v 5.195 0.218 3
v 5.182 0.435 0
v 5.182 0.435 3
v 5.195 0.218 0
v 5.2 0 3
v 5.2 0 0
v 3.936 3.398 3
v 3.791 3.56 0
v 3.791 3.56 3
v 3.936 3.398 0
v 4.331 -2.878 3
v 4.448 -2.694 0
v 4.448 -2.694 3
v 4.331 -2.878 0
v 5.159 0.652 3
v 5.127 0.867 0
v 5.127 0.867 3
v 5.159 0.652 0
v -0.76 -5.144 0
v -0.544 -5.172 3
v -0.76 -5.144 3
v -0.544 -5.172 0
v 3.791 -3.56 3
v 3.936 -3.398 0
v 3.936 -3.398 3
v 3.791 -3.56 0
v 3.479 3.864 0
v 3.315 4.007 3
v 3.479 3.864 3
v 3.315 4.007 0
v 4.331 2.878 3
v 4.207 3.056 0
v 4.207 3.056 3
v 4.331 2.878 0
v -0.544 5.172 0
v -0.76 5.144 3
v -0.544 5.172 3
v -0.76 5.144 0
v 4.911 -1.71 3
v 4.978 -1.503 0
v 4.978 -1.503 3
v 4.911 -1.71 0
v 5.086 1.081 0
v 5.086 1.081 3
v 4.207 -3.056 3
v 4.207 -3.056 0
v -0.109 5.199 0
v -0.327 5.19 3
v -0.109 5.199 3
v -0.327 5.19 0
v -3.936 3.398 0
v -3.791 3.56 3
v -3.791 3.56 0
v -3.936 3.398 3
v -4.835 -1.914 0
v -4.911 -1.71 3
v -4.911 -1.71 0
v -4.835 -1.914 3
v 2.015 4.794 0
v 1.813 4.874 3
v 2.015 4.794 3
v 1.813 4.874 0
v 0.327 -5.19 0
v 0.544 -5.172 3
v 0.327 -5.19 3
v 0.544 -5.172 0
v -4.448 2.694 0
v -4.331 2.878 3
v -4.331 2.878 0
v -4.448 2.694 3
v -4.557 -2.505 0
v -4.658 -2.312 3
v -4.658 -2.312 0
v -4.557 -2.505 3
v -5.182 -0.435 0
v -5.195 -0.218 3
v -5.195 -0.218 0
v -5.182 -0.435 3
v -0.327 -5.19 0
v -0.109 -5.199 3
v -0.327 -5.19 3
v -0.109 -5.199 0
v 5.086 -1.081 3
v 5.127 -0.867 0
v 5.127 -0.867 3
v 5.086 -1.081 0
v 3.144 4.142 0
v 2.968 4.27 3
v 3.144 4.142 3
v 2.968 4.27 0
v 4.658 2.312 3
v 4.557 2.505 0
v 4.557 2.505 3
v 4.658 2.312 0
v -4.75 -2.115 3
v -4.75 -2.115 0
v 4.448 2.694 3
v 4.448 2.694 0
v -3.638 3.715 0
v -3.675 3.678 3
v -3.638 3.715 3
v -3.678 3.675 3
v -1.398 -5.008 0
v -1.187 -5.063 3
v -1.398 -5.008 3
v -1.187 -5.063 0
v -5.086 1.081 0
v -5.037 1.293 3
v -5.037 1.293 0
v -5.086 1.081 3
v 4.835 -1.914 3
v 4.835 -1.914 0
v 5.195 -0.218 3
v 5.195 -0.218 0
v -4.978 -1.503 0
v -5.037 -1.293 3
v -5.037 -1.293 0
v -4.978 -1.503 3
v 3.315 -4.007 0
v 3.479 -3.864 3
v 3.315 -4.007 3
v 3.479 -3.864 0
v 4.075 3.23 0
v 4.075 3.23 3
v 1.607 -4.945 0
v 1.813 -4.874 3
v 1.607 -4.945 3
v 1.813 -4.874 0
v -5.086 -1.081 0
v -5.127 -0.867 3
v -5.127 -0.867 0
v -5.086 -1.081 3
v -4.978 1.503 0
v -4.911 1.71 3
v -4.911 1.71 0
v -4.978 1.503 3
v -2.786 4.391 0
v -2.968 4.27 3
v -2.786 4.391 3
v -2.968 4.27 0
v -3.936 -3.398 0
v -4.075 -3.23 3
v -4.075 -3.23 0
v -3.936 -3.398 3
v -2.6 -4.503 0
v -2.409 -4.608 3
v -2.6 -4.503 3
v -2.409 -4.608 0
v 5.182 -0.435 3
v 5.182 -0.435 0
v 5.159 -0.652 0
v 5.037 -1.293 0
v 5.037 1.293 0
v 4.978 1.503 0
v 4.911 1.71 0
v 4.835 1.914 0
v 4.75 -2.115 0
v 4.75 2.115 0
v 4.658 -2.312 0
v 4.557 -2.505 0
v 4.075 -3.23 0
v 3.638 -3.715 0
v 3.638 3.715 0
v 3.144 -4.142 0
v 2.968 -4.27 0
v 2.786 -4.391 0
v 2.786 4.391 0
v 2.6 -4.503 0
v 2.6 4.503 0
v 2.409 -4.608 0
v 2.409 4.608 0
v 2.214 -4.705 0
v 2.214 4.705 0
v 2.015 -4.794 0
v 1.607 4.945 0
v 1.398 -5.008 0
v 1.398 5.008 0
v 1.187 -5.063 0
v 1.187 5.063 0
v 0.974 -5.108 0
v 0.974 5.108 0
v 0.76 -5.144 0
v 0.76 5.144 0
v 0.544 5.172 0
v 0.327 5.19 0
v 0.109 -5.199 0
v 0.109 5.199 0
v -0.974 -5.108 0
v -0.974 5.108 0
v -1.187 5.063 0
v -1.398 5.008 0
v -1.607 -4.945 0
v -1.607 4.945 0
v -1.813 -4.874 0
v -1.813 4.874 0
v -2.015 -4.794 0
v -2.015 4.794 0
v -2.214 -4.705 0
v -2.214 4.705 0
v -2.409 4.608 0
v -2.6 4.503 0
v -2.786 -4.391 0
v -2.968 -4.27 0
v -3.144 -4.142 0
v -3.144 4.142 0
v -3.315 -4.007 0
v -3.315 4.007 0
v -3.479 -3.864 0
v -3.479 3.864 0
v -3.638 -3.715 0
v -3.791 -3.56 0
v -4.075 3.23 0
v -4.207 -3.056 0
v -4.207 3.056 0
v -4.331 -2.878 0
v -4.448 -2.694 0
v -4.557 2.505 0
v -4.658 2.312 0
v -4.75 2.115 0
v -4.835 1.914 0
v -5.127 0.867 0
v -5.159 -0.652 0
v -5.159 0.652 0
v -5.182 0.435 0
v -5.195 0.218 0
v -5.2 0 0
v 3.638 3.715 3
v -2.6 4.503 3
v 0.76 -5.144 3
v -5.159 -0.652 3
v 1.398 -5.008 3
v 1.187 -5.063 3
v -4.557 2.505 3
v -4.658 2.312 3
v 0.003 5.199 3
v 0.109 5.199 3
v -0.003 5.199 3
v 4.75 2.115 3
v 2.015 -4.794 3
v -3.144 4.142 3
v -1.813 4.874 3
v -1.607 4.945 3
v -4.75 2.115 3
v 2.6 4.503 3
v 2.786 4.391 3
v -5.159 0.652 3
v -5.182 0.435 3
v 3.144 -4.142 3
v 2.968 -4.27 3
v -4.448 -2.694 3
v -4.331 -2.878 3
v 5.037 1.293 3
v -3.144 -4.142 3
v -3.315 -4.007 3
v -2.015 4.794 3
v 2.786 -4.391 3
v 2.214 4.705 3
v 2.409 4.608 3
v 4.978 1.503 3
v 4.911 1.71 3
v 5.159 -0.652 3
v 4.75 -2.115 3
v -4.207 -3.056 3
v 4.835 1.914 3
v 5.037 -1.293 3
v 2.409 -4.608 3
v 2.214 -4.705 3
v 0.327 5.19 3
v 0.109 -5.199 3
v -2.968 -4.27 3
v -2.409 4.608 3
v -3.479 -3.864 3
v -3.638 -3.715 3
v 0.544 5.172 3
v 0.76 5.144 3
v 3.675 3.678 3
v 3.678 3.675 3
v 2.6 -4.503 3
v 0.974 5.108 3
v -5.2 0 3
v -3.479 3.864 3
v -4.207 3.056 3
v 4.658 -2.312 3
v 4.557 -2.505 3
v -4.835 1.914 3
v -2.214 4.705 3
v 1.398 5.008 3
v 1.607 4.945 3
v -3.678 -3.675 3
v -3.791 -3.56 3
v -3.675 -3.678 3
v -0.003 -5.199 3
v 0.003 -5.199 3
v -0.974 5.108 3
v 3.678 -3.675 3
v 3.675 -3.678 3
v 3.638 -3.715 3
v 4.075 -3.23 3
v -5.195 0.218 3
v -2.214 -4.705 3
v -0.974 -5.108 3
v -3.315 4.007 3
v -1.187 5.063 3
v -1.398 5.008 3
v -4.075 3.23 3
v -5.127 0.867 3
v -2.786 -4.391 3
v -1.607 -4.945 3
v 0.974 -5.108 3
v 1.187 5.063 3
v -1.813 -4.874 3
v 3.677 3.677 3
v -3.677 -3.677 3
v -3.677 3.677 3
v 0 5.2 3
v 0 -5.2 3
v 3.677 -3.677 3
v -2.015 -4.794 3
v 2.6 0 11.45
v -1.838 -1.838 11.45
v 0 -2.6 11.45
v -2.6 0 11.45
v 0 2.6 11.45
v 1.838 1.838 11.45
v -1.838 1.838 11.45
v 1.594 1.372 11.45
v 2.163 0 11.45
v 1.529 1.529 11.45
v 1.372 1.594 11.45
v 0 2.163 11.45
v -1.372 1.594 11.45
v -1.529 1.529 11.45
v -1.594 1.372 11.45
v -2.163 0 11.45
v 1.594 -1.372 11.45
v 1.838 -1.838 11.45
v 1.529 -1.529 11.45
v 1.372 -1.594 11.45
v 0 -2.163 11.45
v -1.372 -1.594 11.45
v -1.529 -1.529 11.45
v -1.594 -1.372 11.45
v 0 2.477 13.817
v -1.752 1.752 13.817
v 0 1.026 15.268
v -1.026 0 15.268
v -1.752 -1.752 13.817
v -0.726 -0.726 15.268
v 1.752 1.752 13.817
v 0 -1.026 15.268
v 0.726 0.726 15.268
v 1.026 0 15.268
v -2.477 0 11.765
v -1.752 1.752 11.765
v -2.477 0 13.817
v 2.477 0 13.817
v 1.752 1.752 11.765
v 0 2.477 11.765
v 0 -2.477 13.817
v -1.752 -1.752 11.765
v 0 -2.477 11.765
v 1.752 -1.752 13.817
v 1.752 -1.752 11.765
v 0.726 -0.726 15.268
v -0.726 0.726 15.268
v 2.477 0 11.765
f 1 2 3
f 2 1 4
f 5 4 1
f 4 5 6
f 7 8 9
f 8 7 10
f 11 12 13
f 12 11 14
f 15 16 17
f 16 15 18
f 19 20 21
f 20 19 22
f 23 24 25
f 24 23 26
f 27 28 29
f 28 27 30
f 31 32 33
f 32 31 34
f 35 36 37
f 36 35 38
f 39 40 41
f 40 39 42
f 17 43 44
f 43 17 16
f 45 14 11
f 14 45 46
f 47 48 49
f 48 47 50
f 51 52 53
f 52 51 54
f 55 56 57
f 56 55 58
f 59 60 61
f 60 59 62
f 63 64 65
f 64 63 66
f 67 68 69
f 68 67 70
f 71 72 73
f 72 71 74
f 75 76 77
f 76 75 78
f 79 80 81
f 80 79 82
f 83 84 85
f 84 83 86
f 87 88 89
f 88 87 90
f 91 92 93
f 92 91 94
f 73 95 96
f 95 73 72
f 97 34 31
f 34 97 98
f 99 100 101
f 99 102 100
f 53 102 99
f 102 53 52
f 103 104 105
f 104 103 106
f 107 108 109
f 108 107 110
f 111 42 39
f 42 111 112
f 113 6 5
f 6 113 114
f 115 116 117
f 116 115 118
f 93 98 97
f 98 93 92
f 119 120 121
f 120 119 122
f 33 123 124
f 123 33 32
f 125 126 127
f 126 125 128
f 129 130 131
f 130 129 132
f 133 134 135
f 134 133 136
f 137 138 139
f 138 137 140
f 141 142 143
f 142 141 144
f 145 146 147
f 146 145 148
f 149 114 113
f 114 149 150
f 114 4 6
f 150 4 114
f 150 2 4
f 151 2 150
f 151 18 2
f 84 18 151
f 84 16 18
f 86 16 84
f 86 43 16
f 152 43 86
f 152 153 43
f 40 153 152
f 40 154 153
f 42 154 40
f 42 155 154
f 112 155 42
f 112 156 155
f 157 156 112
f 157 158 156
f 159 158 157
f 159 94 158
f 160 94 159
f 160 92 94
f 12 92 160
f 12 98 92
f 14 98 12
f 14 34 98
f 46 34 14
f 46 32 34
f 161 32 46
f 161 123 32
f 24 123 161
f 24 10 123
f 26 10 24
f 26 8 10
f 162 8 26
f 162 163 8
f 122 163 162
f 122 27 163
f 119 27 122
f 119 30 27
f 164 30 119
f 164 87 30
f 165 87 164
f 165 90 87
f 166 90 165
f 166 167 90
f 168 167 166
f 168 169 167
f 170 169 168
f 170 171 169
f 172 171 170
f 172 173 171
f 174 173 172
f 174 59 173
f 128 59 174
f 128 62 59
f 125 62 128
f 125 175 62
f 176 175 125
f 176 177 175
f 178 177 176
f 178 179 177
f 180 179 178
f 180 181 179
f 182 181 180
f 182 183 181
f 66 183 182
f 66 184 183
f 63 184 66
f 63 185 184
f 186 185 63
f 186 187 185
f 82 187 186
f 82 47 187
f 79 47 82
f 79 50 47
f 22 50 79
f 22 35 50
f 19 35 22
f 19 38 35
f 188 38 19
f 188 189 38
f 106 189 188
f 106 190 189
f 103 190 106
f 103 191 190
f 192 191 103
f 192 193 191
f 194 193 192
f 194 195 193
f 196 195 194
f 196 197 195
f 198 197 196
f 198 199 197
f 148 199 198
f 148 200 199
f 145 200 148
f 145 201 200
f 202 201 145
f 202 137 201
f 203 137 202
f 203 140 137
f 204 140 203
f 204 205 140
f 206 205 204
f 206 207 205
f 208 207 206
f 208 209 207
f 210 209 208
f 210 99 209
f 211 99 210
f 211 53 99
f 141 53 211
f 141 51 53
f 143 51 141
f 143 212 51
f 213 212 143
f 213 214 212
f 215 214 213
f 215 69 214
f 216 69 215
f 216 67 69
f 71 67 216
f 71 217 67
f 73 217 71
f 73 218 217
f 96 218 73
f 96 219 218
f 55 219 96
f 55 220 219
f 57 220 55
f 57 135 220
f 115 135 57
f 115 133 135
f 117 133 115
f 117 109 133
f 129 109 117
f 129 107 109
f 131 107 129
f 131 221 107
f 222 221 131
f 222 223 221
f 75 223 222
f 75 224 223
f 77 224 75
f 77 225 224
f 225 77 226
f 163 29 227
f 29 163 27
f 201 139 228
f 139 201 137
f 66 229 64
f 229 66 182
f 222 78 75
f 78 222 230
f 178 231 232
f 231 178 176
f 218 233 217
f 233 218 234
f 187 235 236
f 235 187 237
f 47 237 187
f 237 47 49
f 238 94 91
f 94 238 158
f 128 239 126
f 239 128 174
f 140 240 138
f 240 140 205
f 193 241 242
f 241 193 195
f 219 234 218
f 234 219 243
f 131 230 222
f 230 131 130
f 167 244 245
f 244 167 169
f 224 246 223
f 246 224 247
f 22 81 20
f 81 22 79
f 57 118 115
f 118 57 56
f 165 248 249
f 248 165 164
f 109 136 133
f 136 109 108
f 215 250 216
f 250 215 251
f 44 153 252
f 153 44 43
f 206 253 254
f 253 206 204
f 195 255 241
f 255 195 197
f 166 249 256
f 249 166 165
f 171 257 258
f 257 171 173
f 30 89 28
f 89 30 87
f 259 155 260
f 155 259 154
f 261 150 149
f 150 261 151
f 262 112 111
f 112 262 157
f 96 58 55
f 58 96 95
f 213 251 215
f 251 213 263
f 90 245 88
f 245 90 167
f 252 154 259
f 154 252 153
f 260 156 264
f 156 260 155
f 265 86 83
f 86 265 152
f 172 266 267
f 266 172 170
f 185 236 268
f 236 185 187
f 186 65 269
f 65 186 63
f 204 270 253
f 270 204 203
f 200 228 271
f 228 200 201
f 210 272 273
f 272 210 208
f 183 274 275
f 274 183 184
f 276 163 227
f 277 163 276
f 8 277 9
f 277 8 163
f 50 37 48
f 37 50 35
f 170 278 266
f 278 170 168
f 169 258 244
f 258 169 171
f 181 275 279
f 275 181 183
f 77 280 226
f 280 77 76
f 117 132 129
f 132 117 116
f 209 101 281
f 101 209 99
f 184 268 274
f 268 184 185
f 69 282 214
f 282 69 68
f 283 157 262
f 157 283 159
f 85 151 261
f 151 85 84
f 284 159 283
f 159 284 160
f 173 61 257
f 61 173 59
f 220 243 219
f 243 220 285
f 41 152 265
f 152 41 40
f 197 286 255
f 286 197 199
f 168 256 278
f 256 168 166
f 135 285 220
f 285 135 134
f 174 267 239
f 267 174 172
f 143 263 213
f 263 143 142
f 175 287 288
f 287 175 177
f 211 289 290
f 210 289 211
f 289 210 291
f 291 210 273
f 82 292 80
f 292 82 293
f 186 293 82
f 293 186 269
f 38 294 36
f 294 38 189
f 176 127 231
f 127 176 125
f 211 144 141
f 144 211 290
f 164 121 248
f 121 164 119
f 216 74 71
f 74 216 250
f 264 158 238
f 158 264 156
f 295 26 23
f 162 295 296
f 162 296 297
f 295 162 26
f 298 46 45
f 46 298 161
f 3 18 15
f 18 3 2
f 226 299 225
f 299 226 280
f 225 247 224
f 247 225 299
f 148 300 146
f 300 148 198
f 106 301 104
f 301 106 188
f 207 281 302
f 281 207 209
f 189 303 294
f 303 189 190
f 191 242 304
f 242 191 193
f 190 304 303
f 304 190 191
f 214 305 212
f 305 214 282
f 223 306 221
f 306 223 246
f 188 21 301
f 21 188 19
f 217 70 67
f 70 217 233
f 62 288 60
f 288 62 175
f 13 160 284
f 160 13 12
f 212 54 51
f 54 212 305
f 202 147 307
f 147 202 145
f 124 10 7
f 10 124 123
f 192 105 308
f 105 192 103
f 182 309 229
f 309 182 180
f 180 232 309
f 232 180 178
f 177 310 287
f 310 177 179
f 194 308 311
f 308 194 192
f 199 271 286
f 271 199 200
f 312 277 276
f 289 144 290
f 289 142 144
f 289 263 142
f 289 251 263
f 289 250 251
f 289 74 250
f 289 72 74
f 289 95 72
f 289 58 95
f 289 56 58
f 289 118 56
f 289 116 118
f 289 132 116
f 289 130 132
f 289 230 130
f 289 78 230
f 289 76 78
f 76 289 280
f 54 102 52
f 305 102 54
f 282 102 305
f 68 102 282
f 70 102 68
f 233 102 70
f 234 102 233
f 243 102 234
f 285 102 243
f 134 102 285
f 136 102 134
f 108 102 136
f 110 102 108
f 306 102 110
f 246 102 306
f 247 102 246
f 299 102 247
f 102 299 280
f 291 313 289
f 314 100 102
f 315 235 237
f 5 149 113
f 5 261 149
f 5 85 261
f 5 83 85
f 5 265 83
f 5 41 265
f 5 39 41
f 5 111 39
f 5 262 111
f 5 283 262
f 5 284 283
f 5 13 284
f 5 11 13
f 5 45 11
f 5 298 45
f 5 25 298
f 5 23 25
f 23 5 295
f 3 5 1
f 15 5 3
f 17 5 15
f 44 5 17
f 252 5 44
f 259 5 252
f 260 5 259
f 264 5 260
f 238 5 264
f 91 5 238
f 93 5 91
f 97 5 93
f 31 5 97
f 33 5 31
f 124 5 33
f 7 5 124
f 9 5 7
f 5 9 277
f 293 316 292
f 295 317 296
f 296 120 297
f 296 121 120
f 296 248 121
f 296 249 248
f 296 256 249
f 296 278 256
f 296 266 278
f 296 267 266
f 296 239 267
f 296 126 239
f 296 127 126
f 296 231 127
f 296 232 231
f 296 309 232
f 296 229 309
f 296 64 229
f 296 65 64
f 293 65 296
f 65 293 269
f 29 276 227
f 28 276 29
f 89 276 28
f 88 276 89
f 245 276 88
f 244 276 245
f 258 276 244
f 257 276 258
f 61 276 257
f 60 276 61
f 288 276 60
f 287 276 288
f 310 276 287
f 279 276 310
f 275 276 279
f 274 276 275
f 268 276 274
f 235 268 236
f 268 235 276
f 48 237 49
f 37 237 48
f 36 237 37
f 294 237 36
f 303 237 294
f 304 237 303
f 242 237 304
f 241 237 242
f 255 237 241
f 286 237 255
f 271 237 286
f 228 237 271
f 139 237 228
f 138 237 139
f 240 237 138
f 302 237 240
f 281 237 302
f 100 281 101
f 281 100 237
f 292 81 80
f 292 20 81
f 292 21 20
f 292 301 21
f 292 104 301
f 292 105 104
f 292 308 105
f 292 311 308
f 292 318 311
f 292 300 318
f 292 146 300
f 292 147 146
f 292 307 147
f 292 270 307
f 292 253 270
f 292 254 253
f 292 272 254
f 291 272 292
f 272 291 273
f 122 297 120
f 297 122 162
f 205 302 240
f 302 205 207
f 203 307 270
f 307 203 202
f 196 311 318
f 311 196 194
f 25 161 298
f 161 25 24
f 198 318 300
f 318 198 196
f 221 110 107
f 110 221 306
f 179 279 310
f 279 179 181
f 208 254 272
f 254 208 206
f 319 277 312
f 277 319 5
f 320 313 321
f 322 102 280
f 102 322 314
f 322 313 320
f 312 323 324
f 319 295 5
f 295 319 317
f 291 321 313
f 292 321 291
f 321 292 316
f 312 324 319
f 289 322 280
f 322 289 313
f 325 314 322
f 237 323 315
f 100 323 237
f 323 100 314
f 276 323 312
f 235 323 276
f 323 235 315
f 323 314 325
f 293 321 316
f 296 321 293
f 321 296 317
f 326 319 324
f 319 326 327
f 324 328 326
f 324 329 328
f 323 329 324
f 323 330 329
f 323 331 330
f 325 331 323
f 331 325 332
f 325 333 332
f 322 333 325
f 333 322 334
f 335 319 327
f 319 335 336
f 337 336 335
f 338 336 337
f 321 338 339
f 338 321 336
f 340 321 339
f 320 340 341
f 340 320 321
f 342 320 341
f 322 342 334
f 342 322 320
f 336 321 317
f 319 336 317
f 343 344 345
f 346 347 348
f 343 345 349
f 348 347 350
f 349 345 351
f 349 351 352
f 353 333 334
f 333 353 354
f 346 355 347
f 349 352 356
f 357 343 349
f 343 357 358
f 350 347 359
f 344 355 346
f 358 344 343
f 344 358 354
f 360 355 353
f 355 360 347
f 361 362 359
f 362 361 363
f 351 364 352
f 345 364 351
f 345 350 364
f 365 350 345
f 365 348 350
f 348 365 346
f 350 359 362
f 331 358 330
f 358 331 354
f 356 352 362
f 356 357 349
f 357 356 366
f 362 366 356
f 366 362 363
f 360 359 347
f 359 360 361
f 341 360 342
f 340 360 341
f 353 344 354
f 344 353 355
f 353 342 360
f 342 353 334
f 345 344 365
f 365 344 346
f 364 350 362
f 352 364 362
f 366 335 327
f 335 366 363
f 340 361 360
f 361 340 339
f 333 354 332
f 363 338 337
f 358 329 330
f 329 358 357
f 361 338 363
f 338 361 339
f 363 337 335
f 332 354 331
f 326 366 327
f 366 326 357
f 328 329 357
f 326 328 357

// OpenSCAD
$fn = 150;

union() {
	cylinder(d = 10.4, h = 3.0);
	translate(v = [0, 0, 3.0]) {
		cylinder($fn = 8, d1 = 10.4, d2 = 5.2, h = 8.450000000000001);
	}
	translate(v = [0, 0, 12.790625000000002]) {
		sphere($fn = 8, d = 5.362500000000001);
	}
}
